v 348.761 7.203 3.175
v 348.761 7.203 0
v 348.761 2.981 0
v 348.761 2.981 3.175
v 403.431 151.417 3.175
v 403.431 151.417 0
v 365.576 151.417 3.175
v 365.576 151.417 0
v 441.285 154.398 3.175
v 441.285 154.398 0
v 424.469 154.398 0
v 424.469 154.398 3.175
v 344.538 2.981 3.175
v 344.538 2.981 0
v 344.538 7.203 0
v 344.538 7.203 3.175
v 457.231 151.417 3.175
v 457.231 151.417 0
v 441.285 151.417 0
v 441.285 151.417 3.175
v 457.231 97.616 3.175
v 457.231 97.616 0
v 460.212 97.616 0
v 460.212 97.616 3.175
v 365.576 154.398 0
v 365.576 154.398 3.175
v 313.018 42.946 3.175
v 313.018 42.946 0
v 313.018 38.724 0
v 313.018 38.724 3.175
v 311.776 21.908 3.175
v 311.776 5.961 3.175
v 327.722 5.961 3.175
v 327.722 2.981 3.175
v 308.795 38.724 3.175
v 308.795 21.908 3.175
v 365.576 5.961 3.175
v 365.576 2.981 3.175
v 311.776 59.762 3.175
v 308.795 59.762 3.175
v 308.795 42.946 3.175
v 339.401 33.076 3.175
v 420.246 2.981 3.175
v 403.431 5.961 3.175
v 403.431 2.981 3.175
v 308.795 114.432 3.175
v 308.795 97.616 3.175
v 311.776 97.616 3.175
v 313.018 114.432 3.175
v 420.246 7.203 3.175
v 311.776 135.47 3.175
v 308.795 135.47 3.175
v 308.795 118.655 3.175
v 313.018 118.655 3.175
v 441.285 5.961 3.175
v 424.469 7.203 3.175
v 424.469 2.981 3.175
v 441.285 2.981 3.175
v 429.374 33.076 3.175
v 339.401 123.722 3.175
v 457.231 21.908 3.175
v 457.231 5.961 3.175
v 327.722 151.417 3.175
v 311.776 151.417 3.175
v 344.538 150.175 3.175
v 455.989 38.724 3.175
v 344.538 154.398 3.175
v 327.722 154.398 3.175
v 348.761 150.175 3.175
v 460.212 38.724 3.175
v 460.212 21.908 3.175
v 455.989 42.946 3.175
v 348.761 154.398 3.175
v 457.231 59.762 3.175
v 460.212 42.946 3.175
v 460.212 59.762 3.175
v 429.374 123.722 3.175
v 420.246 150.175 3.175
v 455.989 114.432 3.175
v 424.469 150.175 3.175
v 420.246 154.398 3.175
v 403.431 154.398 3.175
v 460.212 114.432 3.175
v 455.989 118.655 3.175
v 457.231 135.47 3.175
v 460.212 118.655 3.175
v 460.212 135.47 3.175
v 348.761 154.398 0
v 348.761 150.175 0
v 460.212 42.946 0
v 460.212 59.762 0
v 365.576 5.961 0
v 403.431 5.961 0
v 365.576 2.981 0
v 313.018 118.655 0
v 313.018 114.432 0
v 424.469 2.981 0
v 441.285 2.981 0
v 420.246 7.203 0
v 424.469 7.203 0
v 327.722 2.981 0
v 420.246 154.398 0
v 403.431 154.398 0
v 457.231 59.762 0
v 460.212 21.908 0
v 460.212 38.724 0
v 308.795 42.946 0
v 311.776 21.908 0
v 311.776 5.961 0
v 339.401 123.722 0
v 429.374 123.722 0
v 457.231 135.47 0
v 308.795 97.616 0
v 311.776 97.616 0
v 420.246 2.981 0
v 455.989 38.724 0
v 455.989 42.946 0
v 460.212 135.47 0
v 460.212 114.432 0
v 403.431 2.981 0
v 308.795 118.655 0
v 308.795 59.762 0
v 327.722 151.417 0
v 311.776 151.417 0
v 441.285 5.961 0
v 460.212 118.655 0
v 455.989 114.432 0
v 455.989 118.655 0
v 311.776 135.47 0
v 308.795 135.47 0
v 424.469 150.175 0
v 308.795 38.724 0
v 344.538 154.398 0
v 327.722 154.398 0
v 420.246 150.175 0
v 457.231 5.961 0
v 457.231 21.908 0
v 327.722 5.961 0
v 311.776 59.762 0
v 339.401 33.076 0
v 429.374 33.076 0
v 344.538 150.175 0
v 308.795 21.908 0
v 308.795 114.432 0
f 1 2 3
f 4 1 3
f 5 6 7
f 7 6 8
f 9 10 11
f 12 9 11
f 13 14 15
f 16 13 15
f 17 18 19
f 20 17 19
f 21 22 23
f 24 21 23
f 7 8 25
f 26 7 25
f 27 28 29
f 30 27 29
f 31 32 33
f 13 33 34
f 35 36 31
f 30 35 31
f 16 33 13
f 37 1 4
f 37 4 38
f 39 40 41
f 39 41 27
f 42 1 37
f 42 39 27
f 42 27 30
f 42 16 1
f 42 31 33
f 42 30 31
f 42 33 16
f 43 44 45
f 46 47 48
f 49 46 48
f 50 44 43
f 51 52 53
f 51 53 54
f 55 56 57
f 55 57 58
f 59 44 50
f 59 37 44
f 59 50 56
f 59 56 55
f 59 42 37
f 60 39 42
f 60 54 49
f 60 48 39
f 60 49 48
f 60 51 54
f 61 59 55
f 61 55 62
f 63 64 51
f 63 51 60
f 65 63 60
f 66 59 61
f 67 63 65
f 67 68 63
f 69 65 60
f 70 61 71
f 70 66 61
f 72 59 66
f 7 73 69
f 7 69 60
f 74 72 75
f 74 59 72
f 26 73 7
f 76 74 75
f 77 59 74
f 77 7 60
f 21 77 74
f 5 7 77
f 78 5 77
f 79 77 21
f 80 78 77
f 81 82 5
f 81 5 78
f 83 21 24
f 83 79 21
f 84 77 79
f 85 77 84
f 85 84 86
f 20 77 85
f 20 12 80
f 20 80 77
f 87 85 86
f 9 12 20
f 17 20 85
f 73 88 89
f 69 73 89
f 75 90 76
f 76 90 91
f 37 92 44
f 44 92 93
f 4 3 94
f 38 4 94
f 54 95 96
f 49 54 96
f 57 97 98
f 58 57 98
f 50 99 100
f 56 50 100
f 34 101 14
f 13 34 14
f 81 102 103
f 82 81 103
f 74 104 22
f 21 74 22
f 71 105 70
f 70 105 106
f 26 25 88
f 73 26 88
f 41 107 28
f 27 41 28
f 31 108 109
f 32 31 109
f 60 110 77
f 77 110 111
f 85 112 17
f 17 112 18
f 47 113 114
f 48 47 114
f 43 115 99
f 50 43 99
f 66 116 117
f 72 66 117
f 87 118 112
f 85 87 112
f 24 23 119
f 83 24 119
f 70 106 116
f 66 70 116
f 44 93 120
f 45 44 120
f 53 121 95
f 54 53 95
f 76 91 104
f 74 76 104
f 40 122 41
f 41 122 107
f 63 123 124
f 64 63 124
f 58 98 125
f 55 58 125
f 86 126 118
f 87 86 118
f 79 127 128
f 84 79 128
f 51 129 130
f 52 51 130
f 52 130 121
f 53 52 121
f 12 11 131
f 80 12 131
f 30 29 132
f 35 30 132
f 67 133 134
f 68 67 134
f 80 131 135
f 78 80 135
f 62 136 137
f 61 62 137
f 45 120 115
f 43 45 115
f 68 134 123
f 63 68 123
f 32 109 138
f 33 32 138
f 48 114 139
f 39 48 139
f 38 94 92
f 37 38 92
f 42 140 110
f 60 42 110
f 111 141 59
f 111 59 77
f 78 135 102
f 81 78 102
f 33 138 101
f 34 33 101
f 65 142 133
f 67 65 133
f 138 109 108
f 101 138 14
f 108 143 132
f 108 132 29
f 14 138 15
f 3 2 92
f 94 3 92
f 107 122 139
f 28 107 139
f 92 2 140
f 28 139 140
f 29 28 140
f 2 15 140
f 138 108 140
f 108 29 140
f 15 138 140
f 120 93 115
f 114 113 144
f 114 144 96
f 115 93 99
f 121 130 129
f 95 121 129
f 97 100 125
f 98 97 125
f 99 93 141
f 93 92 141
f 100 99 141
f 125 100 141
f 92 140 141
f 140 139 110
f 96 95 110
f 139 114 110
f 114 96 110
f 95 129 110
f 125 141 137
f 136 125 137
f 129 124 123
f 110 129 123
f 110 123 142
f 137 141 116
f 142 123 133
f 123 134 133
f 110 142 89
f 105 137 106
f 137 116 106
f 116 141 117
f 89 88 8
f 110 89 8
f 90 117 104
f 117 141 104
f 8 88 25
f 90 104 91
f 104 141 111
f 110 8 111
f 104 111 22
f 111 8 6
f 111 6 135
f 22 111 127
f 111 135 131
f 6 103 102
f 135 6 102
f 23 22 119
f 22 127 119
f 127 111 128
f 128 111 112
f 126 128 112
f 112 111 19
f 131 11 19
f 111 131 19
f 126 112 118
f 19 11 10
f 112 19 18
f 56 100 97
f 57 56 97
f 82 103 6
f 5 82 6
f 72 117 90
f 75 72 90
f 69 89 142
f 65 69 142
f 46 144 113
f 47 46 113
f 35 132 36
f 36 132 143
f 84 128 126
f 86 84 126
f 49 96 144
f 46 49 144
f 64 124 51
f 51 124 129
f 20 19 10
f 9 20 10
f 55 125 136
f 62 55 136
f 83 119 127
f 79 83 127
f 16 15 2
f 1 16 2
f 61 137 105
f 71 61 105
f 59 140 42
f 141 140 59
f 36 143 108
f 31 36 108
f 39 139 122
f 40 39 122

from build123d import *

# Parameters (mm, degrees)
SKETCH1_W           = 89.973098965
SKETCH1_H           = 90.646237782
BOSS_EXTRUDE1_DEPTH = 3.175


with BuildPart() as part:
    # Sketch1 → Boss-Extrude1 (new body)
    with BuildSketch(Plane.XY):
        Polygon((311.775650515, 151.416855126), (311.775650515, 135.470394989), (308.79500376, 135.470394989), (308.79500376, 118.65457955), (313.017586662, 118.65457955), (313.017586662, 116.543288099), (313.017586662, 114.431996648), (308.79500376, 114.431996648), (308.79500376, 97.616181208), (311.775650515, 97.616181208), (311.775650515, 59.761967427), (308.79500376, 59.761967427), (308.79500376, 42.946151987), (313.017586662, 42.946151987), (313.017586662, 40.834860536), (313.017586662, 38.723569085), (308.79500376, 38.723569085), (308.79500376, 21.907753645), (311.775650515, 21.907753645), (311.775650515, 5.961293509), (327.722110651, 5.961293509), (327.722110651, 2.980646754), (344.53792609, 2.980646754), (344.53792609, 7.203229657), (346.649217542, 7.203229657), (348.760508993, 7.203229657), (348.760508993, 2.980646754), (365.576324432, 2.980646754), (365.576324432, 5.961293509), (403.430538214, 5.961293509), (403.430538214, 2.980646754), (420.246353653, 2.980646754), (420.246353653, 7.203229657), (422.357645104, 7.203229657), (424.468936555, 7.203229657), (424.468936555, 2.980646754), (441.284751995, 2.980646754), (441.284751995, 5.961293509), (457.231212131, 5.961293509), (457.231212131, 21.907753645), (460.211858886, 21.907753645), (460.211858886, 38.723569085), (455.989275984, 38.723569085), (455.989275984, 40.834860536), (455.989275984, 42.946151987), (460.211858886, 42.946151987), (460.211858886, 59.761967427), (457.231212131, 59.761967427), (457.231212131, 97.616181208), (460.211858886, 97.616181208), (460.211858886, 114.431996648), (455.989275984, 114.431996648), (455.989275984, 116.543288099), (455.989275984, 118.65457955), (460.211858886, 118.65457955), (460.211858886, 135.470394989), (457.231212131, 135.470394989), (457.231212131, 151.416855126), (441.284751995, 151.416855126), (441.284751995, 154.39750188), (424.468936555, 154.39750188), (424.468936555, 150.174918978), (422.357645104, 150.174918978), (420.246353653, 150.174918978), (420.246353653, 154.39750188), (403.430538214, 154.39750188), (403.430538214, 151.416855126), (365.576324432, 151.416855126), (365.576324432, 154.39750188), (348.760508993, 154.39750188), (348.760508993, 150.174918978), (346.649217542, 150.174918978), (344.53792609, 150.174918978), (344.53792609, 154.39750188), (327.722110651, 154.39750188), (327.722110651, 151.416855126), align=None)
        with Locations((384.387424227, 78.399039157)):
            Rectangle(SKETCH1_W, SKETCH1_H, mode=Mode.SUBTRACT)
    extrude(amount=BOSS_EXTRUDE1_DEPTH)


solid = part.part
